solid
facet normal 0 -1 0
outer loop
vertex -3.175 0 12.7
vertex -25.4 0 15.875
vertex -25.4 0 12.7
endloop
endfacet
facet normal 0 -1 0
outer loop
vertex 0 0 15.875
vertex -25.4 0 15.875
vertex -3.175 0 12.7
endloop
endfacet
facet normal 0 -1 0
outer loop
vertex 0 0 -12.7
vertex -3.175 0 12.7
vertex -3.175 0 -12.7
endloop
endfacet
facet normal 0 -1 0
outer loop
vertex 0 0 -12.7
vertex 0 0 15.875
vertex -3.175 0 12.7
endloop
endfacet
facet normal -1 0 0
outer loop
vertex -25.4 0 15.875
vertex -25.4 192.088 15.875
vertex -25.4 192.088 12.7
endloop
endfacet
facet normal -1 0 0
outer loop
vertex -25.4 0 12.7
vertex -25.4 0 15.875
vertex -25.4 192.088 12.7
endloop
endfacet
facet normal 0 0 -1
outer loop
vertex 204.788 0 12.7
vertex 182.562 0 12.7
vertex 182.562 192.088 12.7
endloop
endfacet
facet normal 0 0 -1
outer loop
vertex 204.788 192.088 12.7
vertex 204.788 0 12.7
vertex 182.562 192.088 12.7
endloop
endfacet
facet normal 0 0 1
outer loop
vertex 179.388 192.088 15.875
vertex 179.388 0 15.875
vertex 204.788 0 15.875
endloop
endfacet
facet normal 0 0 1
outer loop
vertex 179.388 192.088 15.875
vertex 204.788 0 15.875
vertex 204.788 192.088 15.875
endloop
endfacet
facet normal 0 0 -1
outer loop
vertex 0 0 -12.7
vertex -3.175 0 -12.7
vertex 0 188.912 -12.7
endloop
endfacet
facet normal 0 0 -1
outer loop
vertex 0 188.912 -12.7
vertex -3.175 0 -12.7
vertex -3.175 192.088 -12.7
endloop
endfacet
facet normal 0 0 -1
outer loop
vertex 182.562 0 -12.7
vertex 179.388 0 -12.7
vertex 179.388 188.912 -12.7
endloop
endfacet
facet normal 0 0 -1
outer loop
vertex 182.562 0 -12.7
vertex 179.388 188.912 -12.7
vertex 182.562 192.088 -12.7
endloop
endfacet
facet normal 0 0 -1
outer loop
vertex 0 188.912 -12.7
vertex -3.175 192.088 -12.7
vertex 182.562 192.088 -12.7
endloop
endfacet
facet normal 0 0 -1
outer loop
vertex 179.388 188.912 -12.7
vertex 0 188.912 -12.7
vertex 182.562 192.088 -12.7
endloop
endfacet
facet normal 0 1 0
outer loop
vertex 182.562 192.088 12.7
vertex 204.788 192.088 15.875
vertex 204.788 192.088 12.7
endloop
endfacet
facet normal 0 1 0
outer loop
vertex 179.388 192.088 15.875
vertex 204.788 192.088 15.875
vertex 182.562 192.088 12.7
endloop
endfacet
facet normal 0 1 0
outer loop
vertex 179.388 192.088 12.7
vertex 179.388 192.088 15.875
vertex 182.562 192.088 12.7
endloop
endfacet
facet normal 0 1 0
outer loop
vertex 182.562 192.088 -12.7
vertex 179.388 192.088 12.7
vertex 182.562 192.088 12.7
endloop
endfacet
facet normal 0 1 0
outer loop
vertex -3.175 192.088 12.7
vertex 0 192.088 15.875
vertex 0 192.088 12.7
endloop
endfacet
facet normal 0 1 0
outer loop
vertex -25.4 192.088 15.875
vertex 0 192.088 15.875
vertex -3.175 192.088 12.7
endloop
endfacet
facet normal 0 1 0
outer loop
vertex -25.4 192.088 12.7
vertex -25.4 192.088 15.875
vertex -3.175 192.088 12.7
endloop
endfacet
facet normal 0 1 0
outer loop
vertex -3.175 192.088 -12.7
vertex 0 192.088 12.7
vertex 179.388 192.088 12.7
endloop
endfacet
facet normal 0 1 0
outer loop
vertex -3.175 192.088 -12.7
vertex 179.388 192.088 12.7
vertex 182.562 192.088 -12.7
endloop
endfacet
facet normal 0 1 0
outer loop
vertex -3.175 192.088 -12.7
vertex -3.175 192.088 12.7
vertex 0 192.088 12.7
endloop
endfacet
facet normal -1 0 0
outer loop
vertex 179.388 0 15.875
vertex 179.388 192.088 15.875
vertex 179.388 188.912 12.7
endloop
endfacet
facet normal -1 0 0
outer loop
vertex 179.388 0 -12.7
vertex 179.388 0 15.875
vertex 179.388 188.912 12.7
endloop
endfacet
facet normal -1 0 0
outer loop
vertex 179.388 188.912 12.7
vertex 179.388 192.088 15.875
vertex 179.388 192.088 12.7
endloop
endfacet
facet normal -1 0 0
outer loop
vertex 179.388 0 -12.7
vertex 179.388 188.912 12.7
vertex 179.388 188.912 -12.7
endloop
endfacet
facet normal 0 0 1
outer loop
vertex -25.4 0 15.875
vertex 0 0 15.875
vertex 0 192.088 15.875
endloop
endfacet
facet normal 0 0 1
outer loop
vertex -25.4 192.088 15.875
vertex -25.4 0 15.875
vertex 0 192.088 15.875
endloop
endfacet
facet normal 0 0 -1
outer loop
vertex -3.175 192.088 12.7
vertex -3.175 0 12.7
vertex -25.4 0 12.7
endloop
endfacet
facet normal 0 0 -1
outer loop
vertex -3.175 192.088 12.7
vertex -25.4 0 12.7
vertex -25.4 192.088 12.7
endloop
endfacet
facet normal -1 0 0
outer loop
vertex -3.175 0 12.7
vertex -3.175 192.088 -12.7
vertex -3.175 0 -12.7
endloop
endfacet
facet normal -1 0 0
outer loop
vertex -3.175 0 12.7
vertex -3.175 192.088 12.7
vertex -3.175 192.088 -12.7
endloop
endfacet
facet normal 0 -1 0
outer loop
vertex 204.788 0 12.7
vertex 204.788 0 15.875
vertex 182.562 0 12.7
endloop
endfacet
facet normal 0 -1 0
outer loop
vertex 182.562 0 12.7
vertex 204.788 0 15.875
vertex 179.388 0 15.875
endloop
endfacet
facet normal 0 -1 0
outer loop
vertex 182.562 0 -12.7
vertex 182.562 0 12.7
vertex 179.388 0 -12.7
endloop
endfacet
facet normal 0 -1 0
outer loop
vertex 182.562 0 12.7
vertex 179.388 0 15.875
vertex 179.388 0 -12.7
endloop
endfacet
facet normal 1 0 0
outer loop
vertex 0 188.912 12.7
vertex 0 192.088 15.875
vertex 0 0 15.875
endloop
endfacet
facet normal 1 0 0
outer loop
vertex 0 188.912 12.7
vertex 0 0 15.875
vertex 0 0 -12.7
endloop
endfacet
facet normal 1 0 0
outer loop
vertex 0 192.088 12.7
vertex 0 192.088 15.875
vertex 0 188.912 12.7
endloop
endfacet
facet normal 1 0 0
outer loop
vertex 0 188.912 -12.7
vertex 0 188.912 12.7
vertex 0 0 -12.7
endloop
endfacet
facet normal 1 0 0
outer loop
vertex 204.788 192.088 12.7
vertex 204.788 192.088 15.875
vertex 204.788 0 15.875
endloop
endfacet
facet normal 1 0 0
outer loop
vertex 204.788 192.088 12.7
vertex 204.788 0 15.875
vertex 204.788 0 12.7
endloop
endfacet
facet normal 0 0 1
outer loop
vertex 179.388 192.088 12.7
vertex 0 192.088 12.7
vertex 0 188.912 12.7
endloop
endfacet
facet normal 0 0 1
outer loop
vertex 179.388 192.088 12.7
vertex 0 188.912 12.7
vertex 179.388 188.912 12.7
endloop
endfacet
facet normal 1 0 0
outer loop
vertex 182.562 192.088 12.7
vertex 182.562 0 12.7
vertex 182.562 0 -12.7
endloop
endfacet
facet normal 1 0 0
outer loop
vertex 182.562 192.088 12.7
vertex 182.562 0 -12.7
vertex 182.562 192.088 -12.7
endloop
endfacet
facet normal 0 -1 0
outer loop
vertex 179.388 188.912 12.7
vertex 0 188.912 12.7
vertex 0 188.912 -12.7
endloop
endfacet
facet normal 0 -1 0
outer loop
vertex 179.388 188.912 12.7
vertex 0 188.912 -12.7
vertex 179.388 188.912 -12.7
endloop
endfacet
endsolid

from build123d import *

# Parameters (mm, degrees)
BOSS_EXTRUDE1_DEPTH = 12.7
SKETCH2_W           = 3.175
SKETCH2_H           = 192.0875
BOSS_EXTRUDE2_DEPTH = 25.4


with BuildPart() as part:
    # Sketch1 → Boss-Extrude1 (new body, symmetric)
    with BuildSketch(Plane.XY):
        Polygon((0, 0), (0, 188.9125), (179.3875, 188.9125), (179.3875, 0), (182.5625, 0), (182.5625, 192.0875), (-3.175, 192.0875), (-3.175, 0), align=None)
    extrude(amount=BOSS_EXTRUDE1_DEPTH, both=True)

    # Sketch2 → Boss-Extrude2 (add)
    with BuildSketch(Plane(origin=(0, 0, 0), x_dir=(0, 0, -1), z_dir=(1, 0, 0))):
        with Locations((-14.2875, 96.04375)):
            Rectangle(SKETCH2_W, SKETCH2_H)
    boss_extrude2 = extrude(amount=-BOSS_EXTRUDE2_DEPTH)

    # Mirror1: Boss-Extrude2 across plane
    add(boss_extrude2.mirror(Plane(origin=(89.69375, 0, 0), x_dir=(0, 0, 1), z_dir=(1, 0, 0))))


solid = part.part
